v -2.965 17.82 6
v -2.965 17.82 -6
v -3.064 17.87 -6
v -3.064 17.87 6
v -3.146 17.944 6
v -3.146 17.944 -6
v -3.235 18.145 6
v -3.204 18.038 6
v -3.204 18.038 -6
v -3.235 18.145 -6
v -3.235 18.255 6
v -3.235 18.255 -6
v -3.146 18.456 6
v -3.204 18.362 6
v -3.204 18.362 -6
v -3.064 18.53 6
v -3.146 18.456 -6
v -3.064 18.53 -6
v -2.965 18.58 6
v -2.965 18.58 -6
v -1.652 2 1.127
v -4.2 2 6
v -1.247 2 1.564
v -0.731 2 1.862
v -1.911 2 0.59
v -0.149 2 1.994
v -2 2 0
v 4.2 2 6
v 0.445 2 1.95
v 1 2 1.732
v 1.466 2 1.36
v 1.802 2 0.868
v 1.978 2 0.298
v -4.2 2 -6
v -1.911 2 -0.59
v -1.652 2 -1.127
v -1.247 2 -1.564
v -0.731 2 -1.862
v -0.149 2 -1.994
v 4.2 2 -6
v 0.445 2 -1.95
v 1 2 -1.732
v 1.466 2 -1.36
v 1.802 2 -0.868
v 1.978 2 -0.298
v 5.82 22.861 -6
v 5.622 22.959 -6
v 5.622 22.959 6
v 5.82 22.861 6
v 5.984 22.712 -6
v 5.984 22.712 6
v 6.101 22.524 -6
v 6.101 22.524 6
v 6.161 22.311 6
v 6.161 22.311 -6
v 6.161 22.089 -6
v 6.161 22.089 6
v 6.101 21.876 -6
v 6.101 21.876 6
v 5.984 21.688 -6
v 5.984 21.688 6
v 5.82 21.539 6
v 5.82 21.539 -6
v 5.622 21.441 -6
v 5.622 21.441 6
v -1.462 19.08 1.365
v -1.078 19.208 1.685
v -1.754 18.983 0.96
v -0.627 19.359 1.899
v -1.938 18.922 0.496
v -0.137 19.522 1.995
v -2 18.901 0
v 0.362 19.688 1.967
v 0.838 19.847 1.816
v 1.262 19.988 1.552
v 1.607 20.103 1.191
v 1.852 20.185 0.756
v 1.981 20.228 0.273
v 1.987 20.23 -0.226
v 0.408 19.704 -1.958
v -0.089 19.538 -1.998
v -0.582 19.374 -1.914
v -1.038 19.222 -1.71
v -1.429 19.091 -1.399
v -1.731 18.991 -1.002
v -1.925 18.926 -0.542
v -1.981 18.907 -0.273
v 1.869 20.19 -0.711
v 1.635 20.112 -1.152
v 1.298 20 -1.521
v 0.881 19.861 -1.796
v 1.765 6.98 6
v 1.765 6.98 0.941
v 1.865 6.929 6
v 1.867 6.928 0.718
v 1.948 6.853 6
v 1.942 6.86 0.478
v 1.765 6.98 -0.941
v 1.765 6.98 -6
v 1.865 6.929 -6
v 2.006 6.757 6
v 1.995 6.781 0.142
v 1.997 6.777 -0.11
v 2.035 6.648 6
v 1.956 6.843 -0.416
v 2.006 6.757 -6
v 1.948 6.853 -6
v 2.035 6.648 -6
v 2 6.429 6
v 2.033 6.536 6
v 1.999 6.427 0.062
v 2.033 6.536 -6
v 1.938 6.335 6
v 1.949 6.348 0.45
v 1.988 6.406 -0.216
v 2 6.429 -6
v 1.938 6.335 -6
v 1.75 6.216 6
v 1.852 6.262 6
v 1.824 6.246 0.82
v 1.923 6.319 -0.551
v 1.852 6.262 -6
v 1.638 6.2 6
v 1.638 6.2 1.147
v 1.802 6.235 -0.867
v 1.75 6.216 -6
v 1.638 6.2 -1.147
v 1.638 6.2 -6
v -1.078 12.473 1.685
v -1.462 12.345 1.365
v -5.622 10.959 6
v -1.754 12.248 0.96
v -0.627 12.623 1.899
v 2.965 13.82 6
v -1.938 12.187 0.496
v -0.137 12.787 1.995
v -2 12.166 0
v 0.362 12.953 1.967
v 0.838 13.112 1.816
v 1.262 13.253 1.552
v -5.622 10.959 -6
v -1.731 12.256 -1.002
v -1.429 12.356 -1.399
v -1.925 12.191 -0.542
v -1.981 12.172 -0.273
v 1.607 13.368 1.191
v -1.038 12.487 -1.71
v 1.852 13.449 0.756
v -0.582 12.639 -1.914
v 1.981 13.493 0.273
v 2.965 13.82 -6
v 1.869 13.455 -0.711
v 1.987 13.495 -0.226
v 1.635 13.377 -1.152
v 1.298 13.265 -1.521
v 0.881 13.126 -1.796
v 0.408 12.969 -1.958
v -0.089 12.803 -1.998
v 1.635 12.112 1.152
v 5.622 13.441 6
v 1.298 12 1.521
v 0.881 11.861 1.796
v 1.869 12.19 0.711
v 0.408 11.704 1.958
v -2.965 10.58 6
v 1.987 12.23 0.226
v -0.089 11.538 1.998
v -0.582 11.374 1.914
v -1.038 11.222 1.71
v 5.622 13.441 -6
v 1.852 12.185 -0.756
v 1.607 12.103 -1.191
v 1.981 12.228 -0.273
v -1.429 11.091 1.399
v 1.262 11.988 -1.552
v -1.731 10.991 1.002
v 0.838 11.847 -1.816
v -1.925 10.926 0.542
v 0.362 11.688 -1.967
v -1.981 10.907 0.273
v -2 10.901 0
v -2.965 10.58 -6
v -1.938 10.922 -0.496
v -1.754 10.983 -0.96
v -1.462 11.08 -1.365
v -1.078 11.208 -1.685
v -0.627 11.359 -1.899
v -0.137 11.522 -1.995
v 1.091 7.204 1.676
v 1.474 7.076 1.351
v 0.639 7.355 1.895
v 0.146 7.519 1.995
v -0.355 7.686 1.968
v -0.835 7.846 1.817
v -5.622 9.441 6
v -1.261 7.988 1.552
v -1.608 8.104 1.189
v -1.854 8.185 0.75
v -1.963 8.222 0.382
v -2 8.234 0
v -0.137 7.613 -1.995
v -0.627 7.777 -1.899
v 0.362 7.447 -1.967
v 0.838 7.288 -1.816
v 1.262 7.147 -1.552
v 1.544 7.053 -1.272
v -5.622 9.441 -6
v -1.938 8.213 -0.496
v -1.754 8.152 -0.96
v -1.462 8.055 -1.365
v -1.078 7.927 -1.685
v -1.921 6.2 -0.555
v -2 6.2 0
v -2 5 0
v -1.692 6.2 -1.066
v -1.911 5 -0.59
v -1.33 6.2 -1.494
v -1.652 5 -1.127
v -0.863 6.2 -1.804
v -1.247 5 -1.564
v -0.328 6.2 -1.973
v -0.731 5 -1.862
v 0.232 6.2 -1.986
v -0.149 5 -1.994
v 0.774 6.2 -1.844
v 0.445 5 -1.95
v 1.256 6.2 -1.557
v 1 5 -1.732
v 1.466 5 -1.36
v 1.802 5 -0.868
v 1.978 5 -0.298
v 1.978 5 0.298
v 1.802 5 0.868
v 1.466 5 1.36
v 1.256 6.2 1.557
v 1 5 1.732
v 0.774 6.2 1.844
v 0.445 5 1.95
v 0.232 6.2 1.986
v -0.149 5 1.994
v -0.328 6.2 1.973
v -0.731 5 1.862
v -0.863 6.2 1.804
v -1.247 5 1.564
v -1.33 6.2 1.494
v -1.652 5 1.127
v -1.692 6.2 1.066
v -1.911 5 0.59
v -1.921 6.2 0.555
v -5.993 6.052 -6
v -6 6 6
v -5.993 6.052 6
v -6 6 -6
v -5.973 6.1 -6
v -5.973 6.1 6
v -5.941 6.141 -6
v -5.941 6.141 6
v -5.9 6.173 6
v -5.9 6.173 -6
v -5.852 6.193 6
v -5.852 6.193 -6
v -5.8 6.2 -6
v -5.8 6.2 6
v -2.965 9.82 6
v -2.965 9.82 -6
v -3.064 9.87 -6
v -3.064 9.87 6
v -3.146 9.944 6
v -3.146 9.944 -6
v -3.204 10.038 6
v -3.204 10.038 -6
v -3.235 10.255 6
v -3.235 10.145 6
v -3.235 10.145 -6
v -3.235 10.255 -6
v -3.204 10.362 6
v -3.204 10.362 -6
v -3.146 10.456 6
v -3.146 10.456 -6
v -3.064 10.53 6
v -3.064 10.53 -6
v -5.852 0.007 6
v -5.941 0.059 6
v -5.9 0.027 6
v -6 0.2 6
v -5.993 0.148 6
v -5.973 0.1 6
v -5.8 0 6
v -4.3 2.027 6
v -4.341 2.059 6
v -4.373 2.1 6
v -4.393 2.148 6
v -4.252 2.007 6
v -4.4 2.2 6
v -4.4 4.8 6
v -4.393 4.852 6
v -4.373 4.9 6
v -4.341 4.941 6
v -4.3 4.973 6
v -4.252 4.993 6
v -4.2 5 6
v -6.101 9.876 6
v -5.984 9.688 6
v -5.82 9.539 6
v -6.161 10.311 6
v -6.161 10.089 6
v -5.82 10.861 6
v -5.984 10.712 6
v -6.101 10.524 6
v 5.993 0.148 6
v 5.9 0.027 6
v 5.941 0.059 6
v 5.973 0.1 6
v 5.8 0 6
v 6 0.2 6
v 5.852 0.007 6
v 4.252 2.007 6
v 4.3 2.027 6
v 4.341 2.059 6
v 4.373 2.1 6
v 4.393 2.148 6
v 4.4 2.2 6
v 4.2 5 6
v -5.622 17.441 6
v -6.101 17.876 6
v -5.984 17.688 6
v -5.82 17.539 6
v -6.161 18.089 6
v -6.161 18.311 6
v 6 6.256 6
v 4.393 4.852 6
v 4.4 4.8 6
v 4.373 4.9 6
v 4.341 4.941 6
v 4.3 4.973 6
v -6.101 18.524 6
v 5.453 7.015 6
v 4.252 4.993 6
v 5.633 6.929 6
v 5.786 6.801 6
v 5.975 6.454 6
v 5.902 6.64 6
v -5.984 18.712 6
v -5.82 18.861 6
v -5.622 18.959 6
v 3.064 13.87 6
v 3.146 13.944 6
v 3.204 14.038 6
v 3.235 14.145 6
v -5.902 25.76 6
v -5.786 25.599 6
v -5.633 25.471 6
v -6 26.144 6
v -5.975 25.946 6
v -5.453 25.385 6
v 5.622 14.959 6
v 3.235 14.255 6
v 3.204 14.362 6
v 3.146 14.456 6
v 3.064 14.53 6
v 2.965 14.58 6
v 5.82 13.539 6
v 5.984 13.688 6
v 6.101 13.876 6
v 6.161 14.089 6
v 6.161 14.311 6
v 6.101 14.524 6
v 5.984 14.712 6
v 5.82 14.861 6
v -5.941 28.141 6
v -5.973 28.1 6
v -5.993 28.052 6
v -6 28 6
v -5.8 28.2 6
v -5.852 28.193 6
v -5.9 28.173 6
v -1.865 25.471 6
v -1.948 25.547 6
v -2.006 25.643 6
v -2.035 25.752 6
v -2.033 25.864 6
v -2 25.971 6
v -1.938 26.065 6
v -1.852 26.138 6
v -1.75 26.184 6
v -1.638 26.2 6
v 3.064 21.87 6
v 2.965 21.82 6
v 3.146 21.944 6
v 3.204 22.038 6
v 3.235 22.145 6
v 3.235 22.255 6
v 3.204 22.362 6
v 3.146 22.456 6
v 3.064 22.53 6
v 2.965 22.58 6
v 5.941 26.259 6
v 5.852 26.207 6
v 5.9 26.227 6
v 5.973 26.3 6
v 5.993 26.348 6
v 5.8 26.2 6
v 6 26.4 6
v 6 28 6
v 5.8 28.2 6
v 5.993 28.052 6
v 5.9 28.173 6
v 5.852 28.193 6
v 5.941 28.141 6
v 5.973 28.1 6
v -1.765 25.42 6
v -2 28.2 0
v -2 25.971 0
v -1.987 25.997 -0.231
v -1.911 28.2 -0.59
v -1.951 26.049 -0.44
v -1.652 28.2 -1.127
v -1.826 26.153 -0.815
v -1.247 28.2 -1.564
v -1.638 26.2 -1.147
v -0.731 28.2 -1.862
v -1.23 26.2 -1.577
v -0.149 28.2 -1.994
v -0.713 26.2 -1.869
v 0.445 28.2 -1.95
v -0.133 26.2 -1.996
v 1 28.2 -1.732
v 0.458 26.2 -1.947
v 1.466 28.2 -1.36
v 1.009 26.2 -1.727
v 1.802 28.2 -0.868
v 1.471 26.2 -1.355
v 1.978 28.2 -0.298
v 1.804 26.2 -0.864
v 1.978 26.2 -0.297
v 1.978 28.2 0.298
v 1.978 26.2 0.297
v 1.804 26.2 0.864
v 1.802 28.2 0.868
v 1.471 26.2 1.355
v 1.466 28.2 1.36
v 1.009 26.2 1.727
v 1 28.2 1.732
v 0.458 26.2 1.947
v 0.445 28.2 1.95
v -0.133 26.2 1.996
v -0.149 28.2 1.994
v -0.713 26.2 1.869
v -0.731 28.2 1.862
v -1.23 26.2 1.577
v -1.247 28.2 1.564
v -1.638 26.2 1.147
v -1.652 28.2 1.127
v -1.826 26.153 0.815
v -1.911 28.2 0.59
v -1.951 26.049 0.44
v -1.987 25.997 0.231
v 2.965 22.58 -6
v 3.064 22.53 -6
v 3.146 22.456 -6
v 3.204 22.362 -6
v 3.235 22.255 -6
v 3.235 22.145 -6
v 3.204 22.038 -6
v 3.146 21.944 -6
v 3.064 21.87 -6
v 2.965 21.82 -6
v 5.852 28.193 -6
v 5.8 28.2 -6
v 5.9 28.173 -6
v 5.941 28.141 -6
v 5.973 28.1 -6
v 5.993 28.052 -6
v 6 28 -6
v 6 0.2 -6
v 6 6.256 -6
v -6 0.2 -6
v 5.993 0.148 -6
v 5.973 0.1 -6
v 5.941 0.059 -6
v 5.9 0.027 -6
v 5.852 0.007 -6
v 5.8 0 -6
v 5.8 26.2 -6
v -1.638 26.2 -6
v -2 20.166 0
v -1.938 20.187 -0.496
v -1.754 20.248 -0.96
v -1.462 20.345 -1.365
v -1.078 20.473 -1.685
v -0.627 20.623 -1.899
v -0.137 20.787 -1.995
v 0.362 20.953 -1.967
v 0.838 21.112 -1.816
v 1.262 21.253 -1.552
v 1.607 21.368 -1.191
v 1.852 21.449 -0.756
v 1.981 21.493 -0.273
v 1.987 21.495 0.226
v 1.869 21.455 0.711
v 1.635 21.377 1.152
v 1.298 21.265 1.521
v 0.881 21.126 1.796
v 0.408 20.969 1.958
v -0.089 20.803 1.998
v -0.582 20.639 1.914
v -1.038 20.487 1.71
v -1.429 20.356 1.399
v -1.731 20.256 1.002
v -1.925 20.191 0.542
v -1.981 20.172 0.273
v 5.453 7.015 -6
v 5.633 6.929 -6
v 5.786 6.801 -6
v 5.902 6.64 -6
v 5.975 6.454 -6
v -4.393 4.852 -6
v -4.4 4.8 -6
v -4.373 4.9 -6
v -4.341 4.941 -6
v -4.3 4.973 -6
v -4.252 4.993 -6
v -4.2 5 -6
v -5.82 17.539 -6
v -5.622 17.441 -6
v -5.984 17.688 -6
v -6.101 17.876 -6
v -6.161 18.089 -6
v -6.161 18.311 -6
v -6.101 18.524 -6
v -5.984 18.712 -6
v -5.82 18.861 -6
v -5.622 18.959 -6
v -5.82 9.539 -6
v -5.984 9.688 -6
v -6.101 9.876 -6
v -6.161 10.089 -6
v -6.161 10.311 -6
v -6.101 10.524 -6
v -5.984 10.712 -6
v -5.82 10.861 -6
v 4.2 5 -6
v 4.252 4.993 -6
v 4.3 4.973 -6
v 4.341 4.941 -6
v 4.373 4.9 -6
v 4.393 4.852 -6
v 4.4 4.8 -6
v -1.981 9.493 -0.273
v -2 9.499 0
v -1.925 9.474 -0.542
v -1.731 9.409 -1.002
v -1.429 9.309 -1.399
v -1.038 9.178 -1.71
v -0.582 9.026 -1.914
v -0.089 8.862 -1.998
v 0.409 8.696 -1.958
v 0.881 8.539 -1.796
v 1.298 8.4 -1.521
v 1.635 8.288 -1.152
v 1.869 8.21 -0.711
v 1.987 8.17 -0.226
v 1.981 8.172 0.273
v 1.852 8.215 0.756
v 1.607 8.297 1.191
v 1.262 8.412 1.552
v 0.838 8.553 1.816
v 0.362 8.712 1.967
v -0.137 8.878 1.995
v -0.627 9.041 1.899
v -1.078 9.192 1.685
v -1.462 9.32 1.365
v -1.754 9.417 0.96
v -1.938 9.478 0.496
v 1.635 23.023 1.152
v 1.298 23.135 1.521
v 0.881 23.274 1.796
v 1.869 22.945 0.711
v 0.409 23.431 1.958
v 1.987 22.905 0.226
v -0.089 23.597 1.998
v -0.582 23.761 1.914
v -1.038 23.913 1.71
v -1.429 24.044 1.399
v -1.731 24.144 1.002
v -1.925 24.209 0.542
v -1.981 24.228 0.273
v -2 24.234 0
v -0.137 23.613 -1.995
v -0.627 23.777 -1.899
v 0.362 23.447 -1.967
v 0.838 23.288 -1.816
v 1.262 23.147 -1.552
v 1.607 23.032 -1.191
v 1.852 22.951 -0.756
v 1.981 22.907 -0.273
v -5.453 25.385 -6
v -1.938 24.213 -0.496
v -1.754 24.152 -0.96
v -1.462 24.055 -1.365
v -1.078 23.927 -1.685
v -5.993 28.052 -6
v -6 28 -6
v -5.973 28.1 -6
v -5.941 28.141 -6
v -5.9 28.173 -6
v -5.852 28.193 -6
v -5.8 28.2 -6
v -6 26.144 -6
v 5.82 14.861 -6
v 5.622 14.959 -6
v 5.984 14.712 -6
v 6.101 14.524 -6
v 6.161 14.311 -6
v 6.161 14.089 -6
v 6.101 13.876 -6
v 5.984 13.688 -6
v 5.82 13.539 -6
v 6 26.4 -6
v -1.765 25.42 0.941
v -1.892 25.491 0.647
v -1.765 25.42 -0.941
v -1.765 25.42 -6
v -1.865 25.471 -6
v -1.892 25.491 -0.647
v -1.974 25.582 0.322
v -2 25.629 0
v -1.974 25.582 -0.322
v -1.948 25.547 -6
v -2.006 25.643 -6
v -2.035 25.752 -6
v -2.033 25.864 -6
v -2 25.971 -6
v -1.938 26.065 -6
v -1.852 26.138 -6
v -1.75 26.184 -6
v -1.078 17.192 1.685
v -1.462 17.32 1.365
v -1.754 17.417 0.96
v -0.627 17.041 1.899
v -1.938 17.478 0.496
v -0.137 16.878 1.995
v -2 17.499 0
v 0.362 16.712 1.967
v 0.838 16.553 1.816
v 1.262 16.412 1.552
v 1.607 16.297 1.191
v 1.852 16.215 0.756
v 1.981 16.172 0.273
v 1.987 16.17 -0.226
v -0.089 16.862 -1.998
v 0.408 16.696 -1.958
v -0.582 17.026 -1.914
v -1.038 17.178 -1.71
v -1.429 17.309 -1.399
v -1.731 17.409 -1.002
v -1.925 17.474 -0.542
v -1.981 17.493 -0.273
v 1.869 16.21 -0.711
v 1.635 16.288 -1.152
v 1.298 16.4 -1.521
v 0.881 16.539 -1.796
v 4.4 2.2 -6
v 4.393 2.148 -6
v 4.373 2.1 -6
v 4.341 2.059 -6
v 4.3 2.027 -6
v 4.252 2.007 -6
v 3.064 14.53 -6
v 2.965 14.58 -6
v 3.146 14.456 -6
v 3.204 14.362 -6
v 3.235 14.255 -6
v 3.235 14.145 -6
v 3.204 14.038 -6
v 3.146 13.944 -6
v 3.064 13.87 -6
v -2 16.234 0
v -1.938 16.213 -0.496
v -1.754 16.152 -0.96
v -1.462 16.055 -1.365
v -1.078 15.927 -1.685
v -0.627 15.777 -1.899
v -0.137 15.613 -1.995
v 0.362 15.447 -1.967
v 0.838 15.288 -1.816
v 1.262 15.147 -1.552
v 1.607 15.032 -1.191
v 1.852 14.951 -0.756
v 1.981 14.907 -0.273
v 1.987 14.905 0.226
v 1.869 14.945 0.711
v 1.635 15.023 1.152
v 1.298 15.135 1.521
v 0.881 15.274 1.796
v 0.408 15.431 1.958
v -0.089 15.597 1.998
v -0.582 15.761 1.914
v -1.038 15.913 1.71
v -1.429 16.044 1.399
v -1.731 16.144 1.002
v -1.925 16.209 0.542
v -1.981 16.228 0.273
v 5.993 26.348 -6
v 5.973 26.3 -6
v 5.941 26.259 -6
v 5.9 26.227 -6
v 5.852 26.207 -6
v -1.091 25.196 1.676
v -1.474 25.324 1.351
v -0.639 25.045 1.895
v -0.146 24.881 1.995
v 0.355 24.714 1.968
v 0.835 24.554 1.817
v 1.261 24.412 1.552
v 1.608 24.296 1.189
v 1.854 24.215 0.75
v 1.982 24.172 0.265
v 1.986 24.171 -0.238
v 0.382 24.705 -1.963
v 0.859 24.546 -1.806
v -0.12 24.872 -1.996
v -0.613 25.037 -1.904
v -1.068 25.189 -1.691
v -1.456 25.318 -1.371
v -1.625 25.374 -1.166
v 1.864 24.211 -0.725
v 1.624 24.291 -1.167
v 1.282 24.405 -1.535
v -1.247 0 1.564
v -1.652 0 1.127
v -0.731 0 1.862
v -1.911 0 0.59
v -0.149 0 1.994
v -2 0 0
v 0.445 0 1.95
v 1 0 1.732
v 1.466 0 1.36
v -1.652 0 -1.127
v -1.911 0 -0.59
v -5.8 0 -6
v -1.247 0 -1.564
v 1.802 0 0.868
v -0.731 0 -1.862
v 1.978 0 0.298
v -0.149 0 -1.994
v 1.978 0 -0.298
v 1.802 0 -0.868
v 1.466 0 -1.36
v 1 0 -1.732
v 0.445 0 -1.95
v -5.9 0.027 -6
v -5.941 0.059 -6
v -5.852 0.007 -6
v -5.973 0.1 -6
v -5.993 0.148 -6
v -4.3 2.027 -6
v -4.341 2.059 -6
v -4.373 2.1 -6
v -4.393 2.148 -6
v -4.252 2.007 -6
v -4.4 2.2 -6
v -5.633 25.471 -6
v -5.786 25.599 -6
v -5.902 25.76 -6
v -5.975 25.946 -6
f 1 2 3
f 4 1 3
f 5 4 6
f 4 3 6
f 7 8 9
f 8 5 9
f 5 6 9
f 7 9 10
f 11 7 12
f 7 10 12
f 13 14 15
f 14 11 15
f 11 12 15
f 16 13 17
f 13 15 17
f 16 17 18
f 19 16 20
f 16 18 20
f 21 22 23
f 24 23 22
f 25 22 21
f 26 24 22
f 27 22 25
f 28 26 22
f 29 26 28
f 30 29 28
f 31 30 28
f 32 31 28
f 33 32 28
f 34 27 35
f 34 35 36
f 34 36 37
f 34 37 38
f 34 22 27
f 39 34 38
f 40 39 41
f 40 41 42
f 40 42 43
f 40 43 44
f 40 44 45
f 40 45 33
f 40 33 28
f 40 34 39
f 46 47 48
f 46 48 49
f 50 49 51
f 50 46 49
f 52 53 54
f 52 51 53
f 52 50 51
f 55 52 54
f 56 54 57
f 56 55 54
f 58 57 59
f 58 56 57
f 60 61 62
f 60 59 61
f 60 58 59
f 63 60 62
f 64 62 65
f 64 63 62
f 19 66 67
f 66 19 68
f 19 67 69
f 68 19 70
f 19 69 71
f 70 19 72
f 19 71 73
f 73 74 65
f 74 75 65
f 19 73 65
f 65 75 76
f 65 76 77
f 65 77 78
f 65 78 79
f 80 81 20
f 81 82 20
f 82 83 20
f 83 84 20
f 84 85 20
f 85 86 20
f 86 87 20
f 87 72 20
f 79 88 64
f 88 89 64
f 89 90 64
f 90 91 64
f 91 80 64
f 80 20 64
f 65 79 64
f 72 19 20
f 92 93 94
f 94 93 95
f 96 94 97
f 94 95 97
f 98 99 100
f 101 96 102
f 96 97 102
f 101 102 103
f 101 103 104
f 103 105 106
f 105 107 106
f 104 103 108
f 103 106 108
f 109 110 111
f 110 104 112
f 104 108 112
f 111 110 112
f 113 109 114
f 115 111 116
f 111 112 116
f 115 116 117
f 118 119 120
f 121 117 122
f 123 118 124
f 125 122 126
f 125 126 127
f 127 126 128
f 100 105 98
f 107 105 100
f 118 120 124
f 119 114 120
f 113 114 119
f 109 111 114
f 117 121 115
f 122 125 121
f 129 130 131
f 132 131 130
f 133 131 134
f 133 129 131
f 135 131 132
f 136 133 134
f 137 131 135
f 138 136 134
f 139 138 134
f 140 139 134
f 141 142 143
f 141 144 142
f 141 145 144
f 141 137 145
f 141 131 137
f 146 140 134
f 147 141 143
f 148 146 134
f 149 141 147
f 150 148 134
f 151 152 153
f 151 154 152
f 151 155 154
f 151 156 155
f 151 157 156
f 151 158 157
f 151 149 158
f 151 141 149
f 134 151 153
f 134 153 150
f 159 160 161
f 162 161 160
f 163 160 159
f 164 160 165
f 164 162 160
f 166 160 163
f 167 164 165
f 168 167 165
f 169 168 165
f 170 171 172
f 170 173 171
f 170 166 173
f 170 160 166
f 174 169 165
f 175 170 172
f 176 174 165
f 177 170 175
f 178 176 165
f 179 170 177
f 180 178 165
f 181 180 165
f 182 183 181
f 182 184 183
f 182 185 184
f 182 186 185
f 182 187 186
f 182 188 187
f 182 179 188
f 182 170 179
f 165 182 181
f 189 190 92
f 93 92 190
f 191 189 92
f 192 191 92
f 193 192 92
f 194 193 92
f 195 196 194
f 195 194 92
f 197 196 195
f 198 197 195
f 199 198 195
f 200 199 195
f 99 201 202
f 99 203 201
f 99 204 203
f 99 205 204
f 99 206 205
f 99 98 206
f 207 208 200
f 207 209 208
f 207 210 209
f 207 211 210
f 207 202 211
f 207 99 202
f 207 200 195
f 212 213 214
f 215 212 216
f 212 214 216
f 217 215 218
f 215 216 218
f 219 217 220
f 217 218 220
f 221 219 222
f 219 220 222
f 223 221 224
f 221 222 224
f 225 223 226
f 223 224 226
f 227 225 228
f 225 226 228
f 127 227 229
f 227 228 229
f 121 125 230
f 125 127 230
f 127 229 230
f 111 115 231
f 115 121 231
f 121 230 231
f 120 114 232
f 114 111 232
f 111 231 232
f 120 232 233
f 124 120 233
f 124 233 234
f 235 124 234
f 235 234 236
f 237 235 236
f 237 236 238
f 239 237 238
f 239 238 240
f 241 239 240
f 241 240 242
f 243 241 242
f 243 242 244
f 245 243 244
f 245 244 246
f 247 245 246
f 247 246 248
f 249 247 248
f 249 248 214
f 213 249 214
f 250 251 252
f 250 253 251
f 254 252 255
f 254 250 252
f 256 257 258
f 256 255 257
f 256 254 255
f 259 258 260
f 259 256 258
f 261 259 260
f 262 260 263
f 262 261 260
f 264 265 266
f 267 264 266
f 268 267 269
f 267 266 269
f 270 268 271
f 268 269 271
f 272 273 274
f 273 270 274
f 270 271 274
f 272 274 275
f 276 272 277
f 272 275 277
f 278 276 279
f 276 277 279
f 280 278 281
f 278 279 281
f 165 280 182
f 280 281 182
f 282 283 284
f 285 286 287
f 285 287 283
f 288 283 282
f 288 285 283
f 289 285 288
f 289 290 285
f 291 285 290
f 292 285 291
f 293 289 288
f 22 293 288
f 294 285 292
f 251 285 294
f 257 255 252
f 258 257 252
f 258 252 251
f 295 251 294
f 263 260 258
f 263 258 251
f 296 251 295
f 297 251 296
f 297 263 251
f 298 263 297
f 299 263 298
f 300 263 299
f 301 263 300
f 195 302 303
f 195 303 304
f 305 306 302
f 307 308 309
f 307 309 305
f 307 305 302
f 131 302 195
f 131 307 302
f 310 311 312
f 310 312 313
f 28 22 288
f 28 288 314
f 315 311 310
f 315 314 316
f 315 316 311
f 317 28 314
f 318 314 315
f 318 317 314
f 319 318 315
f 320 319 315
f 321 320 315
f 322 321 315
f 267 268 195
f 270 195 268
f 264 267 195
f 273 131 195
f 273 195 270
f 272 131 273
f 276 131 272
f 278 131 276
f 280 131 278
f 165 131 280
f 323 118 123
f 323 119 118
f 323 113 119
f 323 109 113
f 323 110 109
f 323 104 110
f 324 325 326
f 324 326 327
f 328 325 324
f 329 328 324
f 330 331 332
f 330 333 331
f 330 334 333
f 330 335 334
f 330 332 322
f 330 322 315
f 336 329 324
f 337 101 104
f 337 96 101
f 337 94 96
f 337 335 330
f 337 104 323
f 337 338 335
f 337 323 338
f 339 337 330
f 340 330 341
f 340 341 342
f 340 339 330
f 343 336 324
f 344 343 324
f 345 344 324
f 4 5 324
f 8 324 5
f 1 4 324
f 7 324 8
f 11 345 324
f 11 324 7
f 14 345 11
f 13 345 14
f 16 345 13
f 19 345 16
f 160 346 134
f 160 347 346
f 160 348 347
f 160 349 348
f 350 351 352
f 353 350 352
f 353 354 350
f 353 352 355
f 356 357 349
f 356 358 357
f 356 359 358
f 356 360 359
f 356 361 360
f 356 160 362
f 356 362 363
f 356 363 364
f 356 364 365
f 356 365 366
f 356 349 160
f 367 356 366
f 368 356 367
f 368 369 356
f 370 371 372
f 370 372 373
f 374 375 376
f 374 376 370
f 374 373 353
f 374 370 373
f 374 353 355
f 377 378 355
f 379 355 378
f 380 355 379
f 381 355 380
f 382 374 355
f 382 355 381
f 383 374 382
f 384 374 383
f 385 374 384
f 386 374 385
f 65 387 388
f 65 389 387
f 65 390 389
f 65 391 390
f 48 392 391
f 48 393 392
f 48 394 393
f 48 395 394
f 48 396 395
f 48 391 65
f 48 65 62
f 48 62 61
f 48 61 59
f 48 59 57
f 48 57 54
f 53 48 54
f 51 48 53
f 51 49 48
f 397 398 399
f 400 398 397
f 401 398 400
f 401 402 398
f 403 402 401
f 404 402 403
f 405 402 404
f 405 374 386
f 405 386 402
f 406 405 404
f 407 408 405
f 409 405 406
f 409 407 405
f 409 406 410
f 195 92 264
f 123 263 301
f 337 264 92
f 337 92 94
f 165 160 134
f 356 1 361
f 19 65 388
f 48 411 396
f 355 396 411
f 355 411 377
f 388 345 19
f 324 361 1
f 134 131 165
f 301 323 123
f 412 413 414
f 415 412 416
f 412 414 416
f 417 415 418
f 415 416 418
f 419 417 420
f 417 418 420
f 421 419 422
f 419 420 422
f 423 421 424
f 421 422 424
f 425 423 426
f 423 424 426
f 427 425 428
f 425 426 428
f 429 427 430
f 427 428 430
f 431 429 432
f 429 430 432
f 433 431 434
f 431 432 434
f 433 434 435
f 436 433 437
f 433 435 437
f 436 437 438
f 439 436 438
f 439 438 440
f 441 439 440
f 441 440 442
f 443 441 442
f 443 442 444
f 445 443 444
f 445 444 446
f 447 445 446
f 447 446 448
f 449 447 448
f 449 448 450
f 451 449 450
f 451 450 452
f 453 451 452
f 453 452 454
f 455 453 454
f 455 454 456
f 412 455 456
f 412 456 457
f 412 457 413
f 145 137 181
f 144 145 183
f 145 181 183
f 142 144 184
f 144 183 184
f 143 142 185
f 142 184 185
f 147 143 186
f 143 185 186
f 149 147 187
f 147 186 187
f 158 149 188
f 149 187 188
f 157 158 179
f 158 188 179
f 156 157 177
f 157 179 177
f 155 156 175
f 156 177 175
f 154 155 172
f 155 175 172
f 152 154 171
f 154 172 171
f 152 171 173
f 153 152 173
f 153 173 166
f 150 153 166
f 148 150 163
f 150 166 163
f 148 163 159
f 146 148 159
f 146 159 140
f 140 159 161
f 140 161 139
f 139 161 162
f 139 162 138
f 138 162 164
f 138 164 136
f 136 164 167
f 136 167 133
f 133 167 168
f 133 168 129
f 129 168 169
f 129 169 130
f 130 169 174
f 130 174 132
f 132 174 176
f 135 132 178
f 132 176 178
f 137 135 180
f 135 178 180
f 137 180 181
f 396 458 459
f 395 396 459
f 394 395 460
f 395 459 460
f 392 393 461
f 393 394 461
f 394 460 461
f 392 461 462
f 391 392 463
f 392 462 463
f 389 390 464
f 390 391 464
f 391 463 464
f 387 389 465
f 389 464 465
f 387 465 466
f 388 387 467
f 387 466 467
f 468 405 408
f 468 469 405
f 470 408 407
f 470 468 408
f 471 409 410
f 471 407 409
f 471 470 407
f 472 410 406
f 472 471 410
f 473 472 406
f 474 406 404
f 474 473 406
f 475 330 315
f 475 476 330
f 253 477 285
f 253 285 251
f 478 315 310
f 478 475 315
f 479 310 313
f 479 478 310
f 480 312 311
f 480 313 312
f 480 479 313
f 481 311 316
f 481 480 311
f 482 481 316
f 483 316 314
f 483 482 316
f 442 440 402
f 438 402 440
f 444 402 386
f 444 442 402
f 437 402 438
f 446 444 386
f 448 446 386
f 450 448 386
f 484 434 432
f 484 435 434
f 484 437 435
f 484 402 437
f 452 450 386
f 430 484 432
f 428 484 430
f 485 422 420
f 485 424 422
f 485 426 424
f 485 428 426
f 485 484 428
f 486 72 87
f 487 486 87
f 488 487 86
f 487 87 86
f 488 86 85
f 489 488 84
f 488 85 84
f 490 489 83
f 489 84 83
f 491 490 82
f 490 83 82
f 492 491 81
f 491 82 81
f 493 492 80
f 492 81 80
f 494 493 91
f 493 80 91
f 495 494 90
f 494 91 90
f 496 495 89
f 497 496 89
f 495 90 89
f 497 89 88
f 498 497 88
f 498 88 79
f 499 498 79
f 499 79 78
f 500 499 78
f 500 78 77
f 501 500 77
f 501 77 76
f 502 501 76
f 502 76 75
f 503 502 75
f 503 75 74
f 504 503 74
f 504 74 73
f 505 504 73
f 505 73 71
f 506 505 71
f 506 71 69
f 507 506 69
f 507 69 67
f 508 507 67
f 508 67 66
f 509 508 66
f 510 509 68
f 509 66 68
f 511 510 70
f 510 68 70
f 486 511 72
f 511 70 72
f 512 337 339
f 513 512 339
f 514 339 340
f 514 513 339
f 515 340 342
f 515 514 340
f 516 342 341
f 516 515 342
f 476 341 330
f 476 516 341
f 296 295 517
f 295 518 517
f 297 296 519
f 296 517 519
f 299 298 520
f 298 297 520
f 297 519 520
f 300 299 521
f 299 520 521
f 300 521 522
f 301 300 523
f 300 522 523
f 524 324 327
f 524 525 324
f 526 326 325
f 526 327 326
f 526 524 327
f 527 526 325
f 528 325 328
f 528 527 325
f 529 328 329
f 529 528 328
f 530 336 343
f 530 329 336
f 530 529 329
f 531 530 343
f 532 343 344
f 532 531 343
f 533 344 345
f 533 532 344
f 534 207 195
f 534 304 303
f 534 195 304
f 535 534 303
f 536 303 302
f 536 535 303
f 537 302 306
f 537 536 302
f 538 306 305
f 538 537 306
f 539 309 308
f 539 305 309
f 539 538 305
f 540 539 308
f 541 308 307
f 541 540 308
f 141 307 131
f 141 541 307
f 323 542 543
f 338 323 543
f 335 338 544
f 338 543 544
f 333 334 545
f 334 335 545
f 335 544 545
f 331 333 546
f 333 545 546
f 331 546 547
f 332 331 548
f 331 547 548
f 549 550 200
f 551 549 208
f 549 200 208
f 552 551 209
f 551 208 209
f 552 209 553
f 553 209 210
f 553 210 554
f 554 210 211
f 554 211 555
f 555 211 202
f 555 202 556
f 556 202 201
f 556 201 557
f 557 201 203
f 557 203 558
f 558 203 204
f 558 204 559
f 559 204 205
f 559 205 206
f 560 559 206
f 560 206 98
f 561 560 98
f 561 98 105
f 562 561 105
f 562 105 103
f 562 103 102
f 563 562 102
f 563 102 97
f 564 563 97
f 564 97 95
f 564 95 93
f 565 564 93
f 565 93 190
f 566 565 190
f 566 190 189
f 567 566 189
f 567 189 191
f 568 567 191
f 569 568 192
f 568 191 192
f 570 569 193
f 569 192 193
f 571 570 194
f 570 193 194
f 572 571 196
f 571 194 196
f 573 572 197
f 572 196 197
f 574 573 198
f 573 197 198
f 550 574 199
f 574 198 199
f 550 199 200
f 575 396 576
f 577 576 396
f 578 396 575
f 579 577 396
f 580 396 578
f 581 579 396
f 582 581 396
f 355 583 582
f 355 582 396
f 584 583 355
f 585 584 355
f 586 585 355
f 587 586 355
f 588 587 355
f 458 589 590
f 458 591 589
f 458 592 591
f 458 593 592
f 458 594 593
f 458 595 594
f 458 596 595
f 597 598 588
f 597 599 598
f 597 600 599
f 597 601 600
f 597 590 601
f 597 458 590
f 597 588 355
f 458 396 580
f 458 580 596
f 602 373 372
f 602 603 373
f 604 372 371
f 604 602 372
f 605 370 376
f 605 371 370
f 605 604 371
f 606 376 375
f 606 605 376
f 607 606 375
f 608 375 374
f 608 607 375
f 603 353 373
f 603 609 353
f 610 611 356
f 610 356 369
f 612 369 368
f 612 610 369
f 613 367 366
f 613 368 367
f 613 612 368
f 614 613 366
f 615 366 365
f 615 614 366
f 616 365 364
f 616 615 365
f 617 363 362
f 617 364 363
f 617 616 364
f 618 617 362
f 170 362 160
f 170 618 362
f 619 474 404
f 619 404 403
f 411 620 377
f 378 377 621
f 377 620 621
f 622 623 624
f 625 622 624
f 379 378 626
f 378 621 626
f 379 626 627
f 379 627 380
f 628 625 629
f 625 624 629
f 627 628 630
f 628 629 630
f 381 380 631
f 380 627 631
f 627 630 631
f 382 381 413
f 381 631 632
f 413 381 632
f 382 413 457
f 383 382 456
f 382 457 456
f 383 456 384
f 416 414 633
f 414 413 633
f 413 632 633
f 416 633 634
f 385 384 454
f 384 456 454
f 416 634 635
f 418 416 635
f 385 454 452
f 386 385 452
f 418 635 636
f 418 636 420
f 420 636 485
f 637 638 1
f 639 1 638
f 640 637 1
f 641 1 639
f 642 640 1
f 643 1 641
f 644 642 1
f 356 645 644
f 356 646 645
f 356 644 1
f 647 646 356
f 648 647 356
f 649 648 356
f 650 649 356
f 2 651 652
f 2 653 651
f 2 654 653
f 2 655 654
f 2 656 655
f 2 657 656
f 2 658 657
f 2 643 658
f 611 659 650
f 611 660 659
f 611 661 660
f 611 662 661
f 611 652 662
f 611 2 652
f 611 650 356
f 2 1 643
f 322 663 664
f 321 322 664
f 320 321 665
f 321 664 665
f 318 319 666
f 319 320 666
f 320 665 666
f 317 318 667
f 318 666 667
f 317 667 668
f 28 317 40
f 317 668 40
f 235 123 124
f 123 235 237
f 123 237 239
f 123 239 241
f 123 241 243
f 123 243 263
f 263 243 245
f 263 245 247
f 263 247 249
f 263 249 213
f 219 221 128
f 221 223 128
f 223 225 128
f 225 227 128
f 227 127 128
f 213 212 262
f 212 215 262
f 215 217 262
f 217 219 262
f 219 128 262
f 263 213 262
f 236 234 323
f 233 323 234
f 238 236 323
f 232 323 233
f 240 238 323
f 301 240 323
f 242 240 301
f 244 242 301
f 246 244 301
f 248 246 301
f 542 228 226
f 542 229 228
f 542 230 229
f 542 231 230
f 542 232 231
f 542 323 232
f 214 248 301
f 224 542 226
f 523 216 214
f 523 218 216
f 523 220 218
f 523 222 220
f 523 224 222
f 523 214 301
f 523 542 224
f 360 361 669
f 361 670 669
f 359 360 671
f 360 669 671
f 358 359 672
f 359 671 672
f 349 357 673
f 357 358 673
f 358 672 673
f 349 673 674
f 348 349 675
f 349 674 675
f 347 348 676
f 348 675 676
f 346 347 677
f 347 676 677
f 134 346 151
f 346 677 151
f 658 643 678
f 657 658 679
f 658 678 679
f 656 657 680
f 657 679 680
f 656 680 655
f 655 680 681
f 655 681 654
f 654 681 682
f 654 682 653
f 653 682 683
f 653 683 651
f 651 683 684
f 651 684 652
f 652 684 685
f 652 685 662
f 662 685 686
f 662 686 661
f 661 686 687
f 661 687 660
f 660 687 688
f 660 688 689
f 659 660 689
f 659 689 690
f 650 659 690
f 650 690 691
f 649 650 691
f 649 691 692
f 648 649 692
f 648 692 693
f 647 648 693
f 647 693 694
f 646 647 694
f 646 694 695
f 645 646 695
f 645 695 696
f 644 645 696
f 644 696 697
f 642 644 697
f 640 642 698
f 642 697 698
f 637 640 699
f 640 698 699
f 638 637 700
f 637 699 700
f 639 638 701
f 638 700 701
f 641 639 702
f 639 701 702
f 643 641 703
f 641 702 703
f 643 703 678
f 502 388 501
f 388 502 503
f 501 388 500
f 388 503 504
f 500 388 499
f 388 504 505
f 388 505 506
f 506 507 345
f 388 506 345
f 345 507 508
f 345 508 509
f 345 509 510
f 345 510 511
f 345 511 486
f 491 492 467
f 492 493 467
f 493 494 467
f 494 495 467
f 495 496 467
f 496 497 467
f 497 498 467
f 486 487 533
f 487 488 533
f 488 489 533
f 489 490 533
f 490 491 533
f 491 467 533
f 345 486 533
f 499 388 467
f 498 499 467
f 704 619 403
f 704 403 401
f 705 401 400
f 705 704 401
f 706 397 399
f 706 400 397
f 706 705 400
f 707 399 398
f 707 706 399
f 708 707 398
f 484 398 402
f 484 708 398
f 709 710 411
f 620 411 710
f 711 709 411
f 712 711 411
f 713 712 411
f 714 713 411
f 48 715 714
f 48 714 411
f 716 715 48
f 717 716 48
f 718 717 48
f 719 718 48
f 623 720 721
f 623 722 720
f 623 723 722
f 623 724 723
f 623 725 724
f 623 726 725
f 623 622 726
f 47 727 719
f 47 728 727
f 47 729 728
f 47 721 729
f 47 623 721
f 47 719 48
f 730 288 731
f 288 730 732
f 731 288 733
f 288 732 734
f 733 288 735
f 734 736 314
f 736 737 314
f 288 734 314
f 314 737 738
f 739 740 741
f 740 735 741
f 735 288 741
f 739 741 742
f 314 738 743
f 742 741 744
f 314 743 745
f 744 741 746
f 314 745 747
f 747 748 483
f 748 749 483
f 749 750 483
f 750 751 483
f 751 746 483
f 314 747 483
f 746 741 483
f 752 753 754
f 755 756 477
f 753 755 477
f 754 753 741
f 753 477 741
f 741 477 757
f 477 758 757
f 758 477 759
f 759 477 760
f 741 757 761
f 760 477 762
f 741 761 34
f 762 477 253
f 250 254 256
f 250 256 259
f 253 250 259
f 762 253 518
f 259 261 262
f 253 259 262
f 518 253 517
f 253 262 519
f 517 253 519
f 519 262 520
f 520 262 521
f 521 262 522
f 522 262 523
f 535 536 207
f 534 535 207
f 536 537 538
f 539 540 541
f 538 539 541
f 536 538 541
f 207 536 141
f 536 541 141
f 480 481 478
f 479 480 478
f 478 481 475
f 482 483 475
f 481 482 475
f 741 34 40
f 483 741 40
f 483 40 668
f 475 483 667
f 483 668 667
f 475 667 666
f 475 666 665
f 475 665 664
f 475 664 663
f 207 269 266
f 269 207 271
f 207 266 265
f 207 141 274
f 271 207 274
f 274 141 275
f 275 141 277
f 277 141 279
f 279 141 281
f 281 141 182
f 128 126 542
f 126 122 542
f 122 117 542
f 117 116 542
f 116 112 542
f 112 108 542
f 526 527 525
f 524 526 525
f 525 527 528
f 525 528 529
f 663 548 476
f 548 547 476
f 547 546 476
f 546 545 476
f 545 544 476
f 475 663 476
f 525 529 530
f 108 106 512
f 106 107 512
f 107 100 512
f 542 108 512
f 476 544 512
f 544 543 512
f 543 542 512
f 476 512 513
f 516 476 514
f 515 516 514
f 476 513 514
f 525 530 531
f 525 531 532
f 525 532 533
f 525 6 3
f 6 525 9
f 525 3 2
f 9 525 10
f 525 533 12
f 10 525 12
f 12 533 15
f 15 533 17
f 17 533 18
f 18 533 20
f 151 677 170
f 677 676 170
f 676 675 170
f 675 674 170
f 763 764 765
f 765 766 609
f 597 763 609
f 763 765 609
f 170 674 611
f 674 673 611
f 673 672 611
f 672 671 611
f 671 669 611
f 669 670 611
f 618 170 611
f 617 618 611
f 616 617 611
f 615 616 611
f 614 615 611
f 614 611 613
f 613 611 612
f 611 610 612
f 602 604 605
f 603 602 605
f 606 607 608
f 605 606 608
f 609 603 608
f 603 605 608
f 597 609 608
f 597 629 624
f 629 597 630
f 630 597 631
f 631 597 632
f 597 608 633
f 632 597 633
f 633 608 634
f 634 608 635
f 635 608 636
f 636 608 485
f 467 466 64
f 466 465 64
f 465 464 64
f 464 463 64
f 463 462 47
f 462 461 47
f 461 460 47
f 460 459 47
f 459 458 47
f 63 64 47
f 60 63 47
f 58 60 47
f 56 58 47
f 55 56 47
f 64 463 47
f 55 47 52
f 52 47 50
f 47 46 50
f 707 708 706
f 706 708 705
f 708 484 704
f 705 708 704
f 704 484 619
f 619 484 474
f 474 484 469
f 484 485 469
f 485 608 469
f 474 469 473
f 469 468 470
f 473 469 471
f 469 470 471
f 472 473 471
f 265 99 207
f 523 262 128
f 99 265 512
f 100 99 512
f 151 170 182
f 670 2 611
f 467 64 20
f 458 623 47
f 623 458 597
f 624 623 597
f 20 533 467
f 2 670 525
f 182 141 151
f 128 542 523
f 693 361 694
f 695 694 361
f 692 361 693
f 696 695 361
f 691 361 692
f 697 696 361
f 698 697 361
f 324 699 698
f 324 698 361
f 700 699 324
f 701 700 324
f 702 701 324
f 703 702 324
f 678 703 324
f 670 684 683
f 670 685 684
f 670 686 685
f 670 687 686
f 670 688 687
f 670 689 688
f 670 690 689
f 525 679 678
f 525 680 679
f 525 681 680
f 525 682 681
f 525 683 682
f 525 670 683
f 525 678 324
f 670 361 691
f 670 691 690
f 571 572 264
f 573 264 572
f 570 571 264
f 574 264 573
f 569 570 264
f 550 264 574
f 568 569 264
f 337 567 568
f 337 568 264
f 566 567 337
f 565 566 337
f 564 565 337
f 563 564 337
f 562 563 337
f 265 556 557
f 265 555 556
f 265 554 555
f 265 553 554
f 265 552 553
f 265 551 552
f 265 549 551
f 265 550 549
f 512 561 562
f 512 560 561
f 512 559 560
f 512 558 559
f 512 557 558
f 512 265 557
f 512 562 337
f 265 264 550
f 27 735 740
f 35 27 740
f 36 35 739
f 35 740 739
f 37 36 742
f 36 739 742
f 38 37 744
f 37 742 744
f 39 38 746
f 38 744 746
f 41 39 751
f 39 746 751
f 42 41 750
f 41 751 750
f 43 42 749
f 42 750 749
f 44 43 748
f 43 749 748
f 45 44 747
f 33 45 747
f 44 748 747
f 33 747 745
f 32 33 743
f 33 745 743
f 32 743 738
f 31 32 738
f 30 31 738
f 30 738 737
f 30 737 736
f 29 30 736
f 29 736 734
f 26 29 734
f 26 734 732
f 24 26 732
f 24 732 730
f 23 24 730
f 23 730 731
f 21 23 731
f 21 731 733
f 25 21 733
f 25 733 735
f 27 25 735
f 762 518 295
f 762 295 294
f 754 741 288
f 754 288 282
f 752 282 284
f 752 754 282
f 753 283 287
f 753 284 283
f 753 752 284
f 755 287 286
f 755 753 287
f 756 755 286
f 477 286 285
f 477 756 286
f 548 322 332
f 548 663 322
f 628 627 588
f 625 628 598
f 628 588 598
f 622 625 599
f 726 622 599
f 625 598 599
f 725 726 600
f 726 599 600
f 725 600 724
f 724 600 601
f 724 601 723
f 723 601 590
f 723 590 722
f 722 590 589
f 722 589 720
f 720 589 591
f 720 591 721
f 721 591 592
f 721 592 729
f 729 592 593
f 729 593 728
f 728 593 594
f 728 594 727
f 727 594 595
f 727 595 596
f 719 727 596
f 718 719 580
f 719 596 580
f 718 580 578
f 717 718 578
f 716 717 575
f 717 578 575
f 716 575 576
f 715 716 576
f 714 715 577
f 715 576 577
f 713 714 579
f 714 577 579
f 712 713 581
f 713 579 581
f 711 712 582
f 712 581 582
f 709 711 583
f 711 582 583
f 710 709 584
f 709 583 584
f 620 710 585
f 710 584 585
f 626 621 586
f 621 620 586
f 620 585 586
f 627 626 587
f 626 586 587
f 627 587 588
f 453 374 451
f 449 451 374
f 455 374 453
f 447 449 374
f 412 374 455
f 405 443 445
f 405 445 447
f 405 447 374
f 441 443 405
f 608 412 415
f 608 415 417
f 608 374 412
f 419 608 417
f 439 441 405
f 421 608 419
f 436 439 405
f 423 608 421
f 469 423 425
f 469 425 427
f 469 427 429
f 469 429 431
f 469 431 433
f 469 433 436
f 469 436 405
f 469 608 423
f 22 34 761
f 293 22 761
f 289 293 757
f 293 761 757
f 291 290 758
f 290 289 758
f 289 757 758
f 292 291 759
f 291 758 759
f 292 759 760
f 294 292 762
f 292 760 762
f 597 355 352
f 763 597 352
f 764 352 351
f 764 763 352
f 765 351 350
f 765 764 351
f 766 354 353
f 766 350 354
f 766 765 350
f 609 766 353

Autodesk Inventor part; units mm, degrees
ref_plane "YZ Plane" through (0, 0, 0) normal (1, 0, 0) x (0, 1, 0)
ref_plane "XZ Plane" through (0, 0, 0) normal (0, 1, 0) x (-1, 0, 0)
ref_plane "XY Plane" through (0, 0, 0) normal (0, 0, 1) x (1, 0, 0)
sketch "Boceto1" plane through (0, 0, 0) normal (0, 0, 1) x (1, 0, 0)
  line L0 (-4.2, 2) -> (4.2, 2)
  line L1 (-4.4, 4.8) -> (-4.4, 2.2)
  line L2 (4.2, 5) -> (-4.2, 5)
  line L3 (4.4, 2.2) -> (4.4, 4.8)
  line L4 (6, 6.2) -> (6, 0.2)
  line L5 (-3, 6.2) -> (1.6383, 6.2)
  line L6 (-6, 0.2) -> (-6, 6)
  line L7 (-5.8, 0) -> (5.8, 0)
  line L8 (-5.8, 28.2) -> (5.8, 28.2)
  line L9 (6, 28) -> (6, 26.4)
  line L10 (5.8, 26.2) -> (-1.6383, 26.2)
  line L11 (-6, 26.1436) -> (-6, 28)
  line L12 (-3, 6.2) -> (-5.8, 6.2)
  line L13 (-5.1901, 10.47) -> (-5.0521, 10.516)
  line L14 (5.1901, 14.47) -> (5.0521, 14.516)
  line L15 (1.7647, 6.9795) -> (-5.622, 9.441)
  line L16 (-7.7794, 10.1599) -> (-7.7493, 10.2501)
  line L17 (7.7794, 6.2401) -> (7.4, 5.1016)
  line L18 (-5.622, 10.959) -> (2.9651, 13.8205)
  line L19 (7.7493, 14.2501) -> (7.7794, 14.1599)
  line L20 (-7.7493, 10.1499) -> (-7.7794, 10.2401)
  line L21 (2.9651, 14.5795) -> (-5.622, 17.441)
  line L22 (-7.7794, 18.1599) -> (-7.7493, 18.2501)
  line L23 (-2.9651, 17.8205) -> (5.622, 14.959)
  line L24 (7.7794, 14.2401) -> (7.7493, 14.1499)
  line L25 (-2.9651, 18.5795) -> (5.622, 21.441)
  line L26 (7.7794, 22.1599) -> (7.7493, 22.2501)
  line L27 (-7.7794, 18.2401) -> (-7.7493, 18.1499)
  line L28 (-1.7647, 25.4205) -> (5.622, 22.959)
  line L29 (7.7794, 22.2401) -> (7.7493, 22.1499)
  line L30 (6.0017, 22.8324) -> (6, 22.8319)
  line L31 (2.9651, 21.8205) -> (-5.622, 18.959)
  line L32 (6.0017, 21.5676) -> (6, 21.5681)
  line L33 (2.9651, 22.5795) -> (-5.4529, 25.3847)
  line L34 (-2.9651, 9.8205) -> (5.4529, 7.0153)
  line L35 (5.622, 13.441) -> (-2.9651, 10.5795)
  line L36 (-6, 9.5681) -> (-6.0017, 9.5676)
  line L37 (-6.0017, 10.8324) -> (-6, 10.8319)
  line L38 (-5.2246, 10.5735) -> (-5.0521, 10.516)
  line L39 (6, 6.2564) -> (6, 6.2)
  arc A0 (5.622, 21.441) -> (5.622, 22.959) centre (5.3691, 22.2) ccw
  arc A1 (-5.622, 18.959) -> (-5.622, 17.441) centre (-5.3691, 18.2) ccw
  arc A2 (5.622, 13.441) -> (5.622, 14.959) centre (5.3691, 14.2) ccw
  arc A3 (-5.622, 10.959) -> (-5.622, 9.441) centre (-5.3691, 10.2) ccw
  arc A4 (6, 6.2564) -> (5.4529, 7.0153) centre (5.2, 6.2564) ccw
  arc A5 (-6, 26.1436) -> (-5.4529, 25.3847) centre (-5.2, 26.1436) ccw
  arc A6 (-2.8711, 26.2) -> (-2.9343, 25.8103) centre (-2.8711, 26) ccw
  arc A7 (-3.5345, 18.3897) -> (-3.5345, 18.0103) centre (-3.4713, 18.2) ccw
  arc A8 (3.5345, 14.0103) -> (3.5345, 14.3897) centre (3.4713, 14.2) ccw
  arc A9 (-3.5345, 10.3897) -> (-3.5345, 10.0103) centre (-3.4713, 10.2) ccw
  arc A10 (2.8711, 6.2) -> (2.9343, 6.5897) centre (2.8711, 6.4) ccw
  arc A11 (-5.8, 6.2) -> (-6, 6) centre (-5.8, 6) ccw
  arc A12 (-6, 0.2) -> (-5.8, 0) centre (-5.8, 0.2) ccw
  arc A13 (5.8, 0) -> (6, 0.2) centre (5.8, 0.2) ccw
  arc A14 (-5.8, 28.2) -> (-6, 28) centre (-5.8, 28) ccw
  arc A15 (6, 28) -> (5.8, 28.2) centre (5.8, 28) ccw
  arc A16 (5.8, 26.2) -> (6, 26.4) centre (5.8, 26.4) ccw
  arc A17 (-4.2, 5) -> (-4.4, 4.8) centre (-4.2, 4.8) ccw
  arc A18 (-4.4, 2.2) -> (-4.2, 2) centre (-4.2, 2.2) ccw
  arc A19 (4.2, 2) -> (4.4, 2.2) centre (4.2, 2.2) ccw
  arc A20 (4.4, 4.8) -> (4.2, 5) centre (4.2, 4.8) ccw
  arc A21 (3.5345, 22.0103) -> (3.5345, 22.3897) centre (3.4713, 22.2) ccw
  arc A22 (2.9651, 21.8205) -> (2.9651, 22.5795) centre (2.8386, 22.2) ccw
  arc A23 (-2.9651, 18.5795) -> (-2.9651, 17.8205) centre (-2.8386, 18.2) ccw
  arc A24 (2.9651, 13.8205) -> (2.9651, 14.5795) centre (2.8386, 14.2) ccw
  arc A25 (-2.9651, 10.5795) -> (-2.9651, 9.8205) centre (-2.8386, 10.2) ccw
  arc A26 (1.6383, 6.2) -> (1.7647, 6.9795) centre (1.6383, 6.6) ccw
  arc A27 (-1.6383, 26.2) -> (-1.7647, 25.4205) centre (-1.6383, 25.8) ccw
  point P0 (0, 0)
  point P1 (0, 0)
  point P2 (6, 26.2)
  point P3 (6, 28.2)
  point P4 (6, 14.2)
  point P5 (6, 18.2)
  point P6 (6, 22.2)
  point P7 (-6, 10.2)
  point P8 (-6, 14.2)
  point P9 (-6, 18.2)
  point P10 (-6, 22.2)
  point P11 (0, 8.2)
  point P12 (0, 12.2)
  point P13 (0, 16.2)
  point P14 (0, 20.2)
  point P15 (0, 24.2)
  point P16 (4.1039, 22.2)
  dimension "d0" = 2
  dimension "d7" = 16
  dimension "d22" = 0.8
  dimension "d23" = 0.2
  dimension "d24" = 0.2
  dimension "d30" = 0.2
  dimension "d31" = 0.4
extrude "Extrusión1" add sketch "Boceto1" along normal mid plane 12
sketch "Boceto2" plane through (0, 0, 0) normal (0, 1, 0) x (-1, 0, 0)
  circle A0 centre (0, 0) radius 2
  dimension "d27" = 4
extrude "Extrusión2" cut sketch "Boceto2" along normal blind 40
properties part number "_3DPrint"
